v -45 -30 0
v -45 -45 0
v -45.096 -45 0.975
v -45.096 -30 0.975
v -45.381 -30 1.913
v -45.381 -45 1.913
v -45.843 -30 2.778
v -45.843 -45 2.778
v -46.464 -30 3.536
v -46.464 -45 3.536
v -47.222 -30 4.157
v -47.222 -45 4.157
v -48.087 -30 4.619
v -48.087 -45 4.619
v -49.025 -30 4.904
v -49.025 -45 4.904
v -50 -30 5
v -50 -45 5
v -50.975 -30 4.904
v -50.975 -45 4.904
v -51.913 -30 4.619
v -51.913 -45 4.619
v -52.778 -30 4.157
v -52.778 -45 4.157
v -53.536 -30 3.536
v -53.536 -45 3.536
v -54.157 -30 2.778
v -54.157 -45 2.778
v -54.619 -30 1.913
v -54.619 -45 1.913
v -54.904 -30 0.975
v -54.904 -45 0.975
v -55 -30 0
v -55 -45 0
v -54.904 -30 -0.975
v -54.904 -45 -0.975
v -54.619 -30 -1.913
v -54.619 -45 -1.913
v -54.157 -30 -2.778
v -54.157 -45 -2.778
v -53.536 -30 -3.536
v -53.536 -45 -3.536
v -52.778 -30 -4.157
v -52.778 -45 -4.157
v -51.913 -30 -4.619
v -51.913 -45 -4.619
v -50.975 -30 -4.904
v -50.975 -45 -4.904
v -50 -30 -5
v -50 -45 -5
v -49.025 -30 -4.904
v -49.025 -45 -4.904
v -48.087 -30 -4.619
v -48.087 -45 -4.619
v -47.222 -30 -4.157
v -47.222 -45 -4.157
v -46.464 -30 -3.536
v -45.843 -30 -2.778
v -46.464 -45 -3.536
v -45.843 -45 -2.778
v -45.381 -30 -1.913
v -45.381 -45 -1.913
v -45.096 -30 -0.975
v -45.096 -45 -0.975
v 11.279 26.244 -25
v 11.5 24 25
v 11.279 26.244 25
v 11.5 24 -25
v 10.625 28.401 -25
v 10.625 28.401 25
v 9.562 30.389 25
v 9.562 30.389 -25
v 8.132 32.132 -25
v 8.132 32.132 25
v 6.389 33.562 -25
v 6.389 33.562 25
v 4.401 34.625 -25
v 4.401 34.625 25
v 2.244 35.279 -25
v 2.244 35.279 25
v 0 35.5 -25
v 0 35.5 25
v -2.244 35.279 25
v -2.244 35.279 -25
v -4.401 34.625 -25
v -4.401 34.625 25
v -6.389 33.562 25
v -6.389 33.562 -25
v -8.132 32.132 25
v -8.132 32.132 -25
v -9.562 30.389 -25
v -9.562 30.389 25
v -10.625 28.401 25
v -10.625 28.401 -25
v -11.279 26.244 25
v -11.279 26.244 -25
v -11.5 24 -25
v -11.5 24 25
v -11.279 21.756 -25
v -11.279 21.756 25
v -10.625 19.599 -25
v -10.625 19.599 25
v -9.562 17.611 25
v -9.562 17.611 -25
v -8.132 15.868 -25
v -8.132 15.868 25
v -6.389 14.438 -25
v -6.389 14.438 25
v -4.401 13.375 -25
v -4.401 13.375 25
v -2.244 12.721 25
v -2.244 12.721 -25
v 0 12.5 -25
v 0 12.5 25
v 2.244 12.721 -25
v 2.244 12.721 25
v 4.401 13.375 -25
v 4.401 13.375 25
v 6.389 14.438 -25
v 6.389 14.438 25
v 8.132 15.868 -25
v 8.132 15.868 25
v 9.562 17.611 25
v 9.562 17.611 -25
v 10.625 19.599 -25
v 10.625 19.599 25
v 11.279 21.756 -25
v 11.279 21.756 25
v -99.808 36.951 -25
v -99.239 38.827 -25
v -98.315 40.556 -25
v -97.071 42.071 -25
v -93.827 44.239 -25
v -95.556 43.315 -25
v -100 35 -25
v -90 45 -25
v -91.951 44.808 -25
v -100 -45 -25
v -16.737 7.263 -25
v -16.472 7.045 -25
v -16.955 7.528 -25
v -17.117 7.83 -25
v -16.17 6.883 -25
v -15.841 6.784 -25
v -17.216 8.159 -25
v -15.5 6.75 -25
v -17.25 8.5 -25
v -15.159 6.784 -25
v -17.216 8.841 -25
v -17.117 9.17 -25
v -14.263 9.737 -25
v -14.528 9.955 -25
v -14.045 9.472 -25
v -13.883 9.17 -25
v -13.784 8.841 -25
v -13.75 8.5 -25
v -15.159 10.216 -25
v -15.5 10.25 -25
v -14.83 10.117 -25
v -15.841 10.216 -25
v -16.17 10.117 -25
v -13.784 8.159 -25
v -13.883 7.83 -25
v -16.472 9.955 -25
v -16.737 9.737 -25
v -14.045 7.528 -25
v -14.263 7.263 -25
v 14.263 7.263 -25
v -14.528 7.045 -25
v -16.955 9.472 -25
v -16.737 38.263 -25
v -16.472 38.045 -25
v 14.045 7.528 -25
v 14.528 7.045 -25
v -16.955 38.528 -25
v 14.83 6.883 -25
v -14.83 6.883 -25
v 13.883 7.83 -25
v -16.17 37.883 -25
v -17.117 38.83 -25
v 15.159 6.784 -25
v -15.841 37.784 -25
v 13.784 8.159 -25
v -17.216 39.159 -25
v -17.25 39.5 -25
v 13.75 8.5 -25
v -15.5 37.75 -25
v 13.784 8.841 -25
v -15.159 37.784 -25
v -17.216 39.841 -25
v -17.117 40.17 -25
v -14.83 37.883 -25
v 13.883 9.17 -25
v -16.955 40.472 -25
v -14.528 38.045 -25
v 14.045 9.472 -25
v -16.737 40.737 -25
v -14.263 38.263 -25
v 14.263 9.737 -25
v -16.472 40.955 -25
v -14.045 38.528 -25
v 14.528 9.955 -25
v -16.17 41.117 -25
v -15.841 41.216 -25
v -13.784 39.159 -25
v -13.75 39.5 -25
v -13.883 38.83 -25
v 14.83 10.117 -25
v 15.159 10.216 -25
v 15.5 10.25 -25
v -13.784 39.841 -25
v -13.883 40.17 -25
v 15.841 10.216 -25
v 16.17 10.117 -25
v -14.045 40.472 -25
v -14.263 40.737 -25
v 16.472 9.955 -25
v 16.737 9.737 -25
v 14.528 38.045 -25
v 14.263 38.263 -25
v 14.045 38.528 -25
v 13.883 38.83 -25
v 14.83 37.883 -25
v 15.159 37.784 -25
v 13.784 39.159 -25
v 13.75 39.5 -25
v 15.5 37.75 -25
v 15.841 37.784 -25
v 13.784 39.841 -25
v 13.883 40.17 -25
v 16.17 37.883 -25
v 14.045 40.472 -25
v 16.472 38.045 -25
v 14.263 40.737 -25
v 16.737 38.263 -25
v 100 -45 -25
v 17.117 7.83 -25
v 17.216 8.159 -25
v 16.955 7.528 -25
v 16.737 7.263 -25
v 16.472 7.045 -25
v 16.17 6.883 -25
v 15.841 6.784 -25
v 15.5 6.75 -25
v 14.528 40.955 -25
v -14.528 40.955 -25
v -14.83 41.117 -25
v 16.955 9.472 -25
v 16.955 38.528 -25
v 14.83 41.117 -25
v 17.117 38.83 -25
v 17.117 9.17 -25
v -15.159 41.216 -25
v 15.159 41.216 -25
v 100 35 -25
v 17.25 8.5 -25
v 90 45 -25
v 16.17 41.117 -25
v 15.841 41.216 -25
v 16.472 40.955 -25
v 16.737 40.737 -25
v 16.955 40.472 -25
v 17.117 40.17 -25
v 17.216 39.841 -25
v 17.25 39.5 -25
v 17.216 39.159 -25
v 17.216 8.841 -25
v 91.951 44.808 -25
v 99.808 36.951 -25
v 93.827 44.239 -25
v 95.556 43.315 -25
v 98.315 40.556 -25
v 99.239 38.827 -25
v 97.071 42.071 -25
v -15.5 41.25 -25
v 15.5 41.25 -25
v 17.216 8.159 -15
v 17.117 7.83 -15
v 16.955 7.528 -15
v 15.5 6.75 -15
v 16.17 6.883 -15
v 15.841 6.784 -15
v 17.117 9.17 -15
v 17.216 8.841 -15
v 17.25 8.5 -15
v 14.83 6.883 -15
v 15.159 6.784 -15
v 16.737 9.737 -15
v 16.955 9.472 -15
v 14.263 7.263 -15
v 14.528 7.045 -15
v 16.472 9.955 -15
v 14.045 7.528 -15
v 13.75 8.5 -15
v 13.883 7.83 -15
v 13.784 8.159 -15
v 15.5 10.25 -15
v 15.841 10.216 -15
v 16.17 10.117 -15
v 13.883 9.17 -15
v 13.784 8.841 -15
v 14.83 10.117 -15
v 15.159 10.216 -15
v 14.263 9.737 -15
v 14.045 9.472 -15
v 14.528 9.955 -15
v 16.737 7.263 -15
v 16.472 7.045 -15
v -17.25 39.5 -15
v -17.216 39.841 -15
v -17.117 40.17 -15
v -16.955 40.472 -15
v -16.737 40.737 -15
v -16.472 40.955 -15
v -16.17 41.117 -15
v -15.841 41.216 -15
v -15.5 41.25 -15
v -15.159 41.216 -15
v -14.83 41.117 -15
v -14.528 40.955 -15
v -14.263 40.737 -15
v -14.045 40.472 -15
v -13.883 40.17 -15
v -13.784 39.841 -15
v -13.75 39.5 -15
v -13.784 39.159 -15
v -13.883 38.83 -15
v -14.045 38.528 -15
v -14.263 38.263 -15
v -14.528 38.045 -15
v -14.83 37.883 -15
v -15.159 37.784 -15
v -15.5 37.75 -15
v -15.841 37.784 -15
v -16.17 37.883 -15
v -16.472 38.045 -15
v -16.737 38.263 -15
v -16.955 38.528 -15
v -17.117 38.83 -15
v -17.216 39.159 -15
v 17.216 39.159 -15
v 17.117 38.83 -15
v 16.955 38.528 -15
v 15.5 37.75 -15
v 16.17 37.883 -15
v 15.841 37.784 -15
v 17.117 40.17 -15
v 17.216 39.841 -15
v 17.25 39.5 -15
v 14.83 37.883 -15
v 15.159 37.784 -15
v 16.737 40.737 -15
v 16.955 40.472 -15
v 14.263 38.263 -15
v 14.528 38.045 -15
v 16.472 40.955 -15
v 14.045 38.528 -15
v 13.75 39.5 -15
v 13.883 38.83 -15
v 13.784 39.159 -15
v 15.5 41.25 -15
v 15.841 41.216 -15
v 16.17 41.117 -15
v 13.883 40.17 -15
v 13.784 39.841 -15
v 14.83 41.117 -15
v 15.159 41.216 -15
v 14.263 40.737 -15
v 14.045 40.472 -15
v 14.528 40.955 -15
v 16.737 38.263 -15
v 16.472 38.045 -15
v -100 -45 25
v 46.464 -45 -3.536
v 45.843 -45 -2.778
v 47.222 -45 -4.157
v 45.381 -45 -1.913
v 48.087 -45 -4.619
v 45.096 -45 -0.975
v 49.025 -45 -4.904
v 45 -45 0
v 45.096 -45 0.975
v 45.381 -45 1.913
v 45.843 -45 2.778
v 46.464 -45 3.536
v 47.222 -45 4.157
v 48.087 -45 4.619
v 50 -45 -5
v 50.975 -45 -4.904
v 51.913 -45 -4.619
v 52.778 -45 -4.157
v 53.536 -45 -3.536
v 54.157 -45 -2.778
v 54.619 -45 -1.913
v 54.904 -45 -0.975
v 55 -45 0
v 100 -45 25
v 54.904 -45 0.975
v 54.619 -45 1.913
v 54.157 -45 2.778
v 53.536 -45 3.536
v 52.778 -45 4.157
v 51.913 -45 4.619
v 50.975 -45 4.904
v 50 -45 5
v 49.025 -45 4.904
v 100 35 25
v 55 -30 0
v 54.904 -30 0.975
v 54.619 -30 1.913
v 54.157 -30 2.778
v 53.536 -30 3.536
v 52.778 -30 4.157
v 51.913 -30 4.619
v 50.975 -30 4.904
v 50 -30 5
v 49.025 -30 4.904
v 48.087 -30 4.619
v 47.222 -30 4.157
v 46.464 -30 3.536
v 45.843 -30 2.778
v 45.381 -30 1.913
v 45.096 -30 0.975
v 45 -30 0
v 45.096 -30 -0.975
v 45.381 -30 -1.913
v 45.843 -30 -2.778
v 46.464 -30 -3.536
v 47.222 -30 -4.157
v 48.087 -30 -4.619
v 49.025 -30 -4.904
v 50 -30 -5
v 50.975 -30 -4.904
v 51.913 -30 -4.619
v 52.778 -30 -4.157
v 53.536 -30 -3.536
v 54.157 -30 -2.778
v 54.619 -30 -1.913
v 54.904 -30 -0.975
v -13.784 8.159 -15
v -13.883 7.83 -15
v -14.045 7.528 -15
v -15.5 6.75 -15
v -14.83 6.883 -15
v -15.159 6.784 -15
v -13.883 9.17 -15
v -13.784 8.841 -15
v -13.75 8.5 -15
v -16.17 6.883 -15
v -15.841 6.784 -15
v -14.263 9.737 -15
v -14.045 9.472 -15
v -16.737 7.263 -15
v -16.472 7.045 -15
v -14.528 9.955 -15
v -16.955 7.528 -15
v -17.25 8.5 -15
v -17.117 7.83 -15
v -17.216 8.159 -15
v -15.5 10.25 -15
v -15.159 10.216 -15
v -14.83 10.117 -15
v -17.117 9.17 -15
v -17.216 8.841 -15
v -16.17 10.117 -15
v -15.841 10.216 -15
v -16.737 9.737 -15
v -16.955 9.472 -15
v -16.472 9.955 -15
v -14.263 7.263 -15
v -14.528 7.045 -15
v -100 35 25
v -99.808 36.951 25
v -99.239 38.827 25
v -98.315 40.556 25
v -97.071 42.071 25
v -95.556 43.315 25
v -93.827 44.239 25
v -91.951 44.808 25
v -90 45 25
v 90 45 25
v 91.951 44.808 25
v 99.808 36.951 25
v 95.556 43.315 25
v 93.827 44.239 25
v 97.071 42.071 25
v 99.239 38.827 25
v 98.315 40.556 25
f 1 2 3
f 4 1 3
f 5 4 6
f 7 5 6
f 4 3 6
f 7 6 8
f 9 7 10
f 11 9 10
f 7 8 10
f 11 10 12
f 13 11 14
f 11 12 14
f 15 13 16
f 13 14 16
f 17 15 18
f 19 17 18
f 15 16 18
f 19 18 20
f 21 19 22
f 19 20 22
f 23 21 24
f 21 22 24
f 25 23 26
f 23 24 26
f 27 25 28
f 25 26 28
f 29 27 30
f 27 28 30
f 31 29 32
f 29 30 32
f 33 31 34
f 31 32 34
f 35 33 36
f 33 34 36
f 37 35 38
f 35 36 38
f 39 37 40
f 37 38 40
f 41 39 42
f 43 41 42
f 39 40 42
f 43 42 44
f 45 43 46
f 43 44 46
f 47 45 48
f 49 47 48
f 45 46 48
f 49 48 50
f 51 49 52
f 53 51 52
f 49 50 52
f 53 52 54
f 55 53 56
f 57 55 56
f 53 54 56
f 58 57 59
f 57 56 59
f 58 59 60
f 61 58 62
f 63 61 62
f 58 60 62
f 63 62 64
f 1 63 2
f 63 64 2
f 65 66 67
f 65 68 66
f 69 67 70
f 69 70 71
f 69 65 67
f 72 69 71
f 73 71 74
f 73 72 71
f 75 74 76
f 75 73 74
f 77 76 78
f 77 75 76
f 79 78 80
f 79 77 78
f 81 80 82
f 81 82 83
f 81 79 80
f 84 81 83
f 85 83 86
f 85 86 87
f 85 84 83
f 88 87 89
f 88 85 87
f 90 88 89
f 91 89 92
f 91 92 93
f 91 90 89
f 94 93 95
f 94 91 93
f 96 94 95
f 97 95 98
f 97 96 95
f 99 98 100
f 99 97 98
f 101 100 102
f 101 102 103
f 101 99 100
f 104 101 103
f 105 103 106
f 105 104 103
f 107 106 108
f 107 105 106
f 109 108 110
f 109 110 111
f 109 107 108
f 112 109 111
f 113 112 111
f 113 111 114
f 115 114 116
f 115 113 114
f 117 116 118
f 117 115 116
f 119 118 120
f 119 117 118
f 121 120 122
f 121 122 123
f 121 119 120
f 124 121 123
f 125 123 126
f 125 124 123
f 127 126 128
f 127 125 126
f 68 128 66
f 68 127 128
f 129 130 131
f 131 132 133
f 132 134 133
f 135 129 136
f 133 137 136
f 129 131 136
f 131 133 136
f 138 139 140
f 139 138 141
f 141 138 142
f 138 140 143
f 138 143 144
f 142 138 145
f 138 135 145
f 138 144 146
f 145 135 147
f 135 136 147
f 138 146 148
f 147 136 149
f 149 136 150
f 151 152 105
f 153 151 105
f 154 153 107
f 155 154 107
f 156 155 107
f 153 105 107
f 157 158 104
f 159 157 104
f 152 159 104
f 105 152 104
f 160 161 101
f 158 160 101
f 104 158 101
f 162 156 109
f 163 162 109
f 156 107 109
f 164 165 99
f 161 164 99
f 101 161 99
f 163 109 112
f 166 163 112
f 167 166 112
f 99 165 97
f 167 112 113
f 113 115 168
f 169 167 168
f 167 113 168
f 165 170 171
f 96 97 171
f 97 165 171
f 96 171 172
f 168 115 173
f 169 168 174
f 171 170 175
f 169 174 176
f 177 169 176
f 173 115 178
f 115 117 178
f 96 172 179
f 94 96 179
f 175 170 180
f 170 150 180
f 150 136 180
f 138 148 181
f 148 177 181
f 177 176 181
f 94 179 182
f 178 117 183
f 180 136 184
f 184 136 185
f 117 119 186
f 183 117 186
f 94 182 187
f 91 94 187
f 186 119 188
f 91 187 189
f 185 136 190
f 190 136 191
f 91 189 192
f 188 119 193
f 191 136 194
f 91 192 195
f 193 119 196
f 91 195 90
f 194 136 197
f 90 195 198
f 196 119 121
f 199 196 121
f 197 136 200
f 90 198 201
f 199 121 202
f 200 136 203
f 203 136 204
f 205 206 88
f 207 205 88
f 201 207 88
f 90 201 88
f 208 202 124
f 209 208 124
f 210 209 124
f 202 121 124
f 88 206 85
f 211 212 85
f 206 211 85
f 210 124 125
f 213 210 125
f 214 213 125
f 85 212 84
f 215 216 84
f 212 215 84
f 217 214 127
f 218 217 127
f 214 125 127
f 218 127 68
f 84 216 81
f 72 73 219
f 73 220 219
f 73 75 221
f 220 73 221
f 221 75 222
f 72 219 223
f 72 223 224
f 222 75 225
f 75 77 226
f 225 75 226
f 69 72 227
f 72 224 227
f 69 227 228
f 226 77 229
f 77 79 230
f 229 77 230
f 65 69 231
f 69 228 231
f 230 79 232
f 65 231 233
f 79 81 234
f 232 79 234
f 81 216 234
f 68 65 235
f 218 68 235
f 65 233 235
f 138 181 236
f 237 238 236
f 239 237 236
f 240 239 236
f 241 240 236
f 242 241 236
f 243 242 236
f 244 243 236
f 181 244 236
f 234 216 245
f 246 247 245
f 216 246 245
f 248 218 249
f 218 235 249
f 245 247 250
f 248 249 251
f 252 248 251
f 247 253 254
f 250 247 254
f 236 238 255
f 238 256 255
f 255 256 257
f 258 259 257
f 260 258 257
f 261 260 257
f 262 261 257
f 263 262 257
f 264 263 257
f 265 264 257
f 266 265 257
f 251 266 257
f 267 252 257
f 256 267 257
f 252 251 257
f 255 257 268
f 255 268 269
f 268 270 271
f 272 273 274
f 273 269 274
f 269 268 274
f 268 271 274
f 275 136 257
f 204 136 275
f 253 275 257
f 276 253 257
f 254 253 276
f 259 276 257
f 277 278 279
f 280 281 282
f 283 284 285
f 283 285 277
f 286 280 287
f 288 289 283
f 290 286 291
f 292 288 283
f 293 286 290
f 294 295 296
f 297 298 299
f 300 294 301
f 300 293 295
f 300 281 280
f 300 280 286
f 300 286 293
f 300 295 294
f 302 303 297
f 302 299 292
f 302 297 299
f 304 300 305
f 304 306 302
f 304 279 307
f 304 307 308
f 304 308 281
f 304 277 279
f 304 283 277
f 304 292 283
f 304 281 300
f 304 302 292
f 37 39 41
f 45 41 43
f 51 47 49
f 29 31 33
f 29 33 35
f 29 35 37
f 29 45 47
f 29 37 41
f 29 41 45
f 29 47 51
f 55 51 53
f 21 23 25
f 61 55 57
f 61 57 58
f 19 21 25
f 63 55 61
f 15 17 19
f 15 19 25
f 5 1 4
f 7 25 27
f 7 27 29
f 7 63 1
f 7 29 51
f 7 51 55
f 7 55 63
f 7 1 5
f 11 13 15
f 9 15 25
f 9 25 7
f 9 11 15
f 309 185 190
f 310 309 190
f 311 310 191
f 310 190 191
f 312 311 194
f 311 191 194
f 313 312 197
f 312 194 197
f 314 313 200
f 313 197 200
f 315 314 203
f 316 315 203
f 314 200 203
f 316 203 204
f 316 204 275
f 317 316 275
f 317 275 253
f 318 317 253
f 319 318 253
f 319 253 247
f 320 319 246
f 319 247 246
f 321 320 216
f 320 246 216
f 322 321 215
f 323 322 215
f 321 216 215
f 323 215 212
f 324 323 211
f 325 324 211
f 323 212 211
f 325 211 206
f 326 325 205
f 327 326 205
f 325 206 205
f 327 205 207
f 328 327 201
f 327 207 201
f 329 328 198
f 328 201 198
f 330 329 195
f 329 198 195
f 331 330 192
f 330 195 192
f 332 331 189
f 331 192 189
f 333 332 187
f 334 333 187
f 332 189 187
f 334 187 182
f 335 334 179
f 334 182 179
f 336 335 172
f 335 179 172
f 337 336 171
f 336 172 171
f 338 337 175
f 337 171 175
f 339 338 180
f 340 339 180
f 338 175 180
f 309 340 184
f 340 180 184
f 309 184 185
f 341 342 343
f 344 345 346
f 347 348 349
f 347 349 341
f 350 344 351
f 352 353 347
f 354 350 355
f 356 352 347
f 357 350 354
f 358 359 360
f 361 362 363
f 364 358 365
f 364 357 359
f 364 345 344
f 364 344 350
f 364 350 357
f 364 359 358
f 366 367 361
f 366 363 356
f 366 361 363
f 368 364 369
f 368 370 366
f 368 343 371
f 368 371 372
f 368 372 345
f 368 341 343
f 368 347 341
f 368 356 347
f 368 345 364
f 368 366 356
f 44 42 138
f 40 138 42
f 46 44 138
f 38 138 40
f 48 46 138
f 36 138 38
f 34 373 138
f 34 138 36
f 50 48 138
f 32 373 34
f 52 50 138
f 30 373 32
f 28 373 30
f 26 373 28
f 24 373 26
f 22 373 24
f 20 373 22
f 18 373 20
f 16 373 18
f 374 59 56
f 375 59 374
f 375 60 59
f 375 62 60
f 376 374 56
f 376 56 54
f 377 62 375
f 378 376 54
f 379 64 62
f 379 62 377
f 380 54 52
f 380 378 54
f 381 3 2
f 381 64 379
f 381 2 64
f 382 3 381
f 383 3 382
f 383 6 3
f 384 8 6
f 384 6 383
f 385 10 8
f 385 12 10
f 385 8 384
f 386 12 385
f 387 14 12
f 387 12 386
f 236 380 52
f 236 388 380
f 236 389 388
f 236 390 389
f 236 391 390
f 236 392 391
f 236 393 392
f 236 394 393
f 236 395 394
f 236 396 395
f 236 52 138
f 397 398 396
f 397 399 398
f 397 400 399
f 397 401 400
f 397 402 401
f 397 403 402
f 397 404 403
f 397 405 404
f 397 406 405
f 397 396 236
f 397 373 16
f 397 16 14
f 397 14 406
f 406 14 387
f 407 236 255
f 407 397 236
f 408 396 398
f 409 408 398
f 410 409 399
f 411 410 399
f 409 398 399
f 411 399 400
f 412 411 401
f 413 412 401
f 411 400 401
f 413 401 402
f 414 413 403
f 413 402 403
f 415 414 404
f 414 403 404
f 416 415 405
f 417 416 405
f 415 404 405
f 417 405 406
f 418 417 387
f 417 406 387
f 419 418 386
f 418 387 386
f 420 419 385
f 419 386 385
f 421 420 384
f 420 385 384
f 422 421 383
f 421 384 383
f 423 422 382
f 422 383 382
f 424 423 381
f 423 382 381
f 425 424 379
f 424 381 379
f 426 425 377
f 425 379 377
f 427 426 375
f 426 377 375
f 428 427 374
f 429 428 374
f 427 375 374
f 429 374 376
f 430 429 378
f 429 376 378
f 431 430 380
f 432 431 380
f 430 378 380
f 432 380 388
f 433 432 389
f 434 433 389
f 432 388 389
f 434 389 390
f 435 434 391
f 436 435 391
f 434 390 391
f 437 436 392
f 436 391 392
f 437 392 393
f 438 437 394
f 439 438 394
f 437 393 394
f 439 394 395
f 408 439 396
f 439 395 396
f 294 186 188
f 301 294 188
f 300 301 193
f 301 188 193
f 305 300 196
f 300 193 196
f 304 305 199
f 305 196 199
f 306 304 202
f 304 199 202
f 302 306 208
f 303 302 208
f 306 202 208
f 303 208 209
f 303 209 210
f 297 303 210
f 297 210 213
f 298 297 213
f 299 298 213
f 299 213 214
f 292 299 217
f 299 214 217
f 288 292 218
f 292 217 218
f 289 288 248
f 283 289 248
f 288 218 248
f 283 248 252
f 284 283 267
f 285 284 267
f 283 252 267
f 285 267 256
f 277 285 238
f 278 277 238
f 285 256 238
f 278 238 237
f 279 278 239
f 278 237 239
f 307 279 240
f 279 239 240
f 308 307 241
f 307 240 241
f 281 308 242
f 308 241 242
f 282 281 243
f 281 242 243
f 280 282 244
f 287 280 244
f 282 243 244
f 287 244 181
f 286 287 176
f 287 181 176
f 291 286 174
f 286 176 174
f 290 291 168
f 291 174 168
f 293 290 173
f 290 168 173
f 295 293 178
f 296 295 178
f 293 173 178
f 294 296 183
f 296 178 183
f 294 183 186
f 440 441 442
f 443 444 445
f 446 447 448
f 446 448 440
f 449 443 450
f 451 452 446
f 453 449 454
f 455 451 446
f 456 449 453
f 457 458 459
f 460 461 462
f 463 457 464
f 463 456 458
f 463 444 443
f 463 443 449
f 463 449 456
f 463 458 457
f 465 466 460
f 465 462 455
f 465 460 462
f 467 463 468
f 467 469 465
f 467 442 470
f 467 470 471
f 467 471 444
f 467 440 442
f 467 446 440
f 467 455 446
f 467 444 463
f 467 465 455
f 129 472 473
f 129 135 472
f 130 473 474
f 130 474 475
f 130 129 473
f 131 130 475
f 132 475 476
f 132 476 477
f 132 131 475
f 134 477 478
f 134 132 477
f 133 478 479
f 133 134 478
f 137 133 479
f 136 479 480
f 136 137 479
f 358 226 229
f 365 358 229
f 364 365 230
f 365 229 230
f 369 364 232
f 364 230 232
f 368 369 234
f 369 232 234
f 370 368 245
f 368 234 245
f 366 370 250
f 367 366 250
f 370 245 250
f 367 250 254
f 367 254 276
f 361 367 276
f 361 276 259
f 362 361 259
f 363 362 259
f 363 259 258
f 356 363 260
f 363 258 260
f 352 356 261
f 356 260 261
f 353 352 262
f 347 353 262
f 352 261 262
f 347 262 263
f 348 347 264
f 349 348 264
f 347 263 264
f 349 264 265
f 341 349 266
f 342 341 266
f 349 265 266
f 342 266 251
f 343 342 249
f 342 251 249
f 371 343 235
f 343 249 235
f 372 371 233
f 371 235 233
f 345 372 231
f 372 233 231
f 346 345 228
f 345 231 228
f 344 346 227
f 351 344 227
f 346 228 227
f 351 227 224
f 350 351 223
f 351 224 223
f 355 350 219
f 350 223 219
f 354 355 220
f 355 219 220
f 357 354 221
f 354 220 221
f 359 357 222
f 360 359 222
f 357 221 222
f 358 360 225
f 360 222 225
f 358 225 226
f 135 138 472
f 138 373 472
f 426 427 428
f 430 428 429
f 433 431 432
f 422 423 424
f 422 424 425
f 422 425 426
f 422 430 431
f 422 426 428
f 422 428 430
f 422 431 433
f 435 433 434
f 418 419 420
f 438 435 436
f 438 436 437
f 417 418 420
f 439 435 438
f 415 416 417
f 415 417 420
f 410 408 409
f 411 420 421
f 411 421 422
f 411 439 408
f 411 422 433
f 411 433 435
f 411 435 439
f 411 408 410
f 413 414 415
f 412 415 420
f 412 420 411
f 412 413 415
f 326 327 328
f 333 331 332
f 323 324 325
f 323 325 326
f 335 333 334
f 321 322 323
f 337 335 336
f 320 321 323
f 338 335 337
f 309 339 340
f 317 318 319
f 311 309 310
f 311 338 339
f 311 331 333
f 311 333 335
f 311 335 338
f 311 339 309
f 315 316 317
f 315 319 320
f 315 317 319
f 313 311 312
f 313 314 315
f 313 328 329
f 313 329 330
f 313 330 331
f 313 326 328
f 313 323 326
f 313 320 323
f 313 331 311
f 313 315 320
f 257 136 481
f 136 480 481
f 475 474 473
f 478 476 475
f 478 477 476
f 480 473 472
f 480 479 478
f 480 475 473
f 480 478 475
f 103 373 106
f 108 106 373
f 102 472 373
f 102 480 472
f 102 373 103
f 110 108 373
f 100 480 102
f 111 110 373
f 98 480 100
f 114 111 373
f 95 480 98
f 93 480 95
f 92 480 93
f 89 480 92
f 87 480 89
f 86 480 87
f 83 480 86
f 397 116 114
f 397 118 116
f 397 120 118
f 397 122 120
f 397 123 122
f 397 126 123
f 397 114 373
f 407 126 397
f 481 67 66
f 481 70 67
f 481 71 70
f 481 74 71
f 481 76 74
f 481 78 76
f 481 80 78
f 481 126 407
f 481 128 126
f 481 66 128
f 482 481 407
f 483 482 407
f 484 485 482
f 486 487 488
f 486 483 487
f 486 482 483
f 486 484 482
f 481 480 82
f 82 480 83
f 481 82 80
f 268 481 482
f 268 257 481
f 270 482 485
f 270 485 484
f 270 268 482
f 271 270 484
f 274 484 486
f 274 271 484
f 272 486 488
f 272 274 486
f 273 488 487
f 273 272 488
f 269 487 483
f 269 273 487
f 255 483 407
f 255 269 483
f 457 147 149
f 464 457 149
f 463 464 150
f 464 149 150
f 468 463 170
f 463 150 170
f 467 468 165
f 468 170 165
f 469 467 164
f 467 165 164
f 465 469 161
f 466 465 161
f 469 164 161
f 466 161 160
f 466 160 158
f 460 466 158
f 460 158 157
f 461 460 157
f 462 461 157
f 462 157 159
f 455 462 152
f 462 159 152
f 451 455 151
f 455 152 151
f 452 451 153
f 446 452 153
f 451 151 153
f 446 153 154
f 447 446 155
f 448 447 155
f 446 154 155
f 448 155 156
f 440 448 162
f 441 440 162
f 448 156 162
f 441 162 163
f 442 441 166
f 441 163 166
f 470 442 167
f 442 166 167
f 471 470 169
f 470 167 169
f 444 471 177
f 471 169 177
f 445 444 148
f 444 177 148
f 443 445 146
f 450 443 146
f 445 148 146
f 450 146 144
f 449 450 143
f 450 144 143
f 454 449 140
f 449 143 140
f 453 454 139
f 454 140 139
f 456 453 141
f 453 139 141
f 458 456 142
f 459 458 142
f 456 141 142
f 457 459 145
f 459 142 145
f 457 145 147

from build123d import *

# Parameters (mm, degrees)
SKETCH1_W           = 200
SKETCH1_H           = 90
SKETCH1_R           = 11.5
BOSS_EXTRUDE1_DEPTH = 25
SKETCH2_R           = 1.75
CUT_EXTRUDE1_DEPTH  = 10
SKETCH3_R           = 5
CUT_EXTRUDE2_DEPTH  = 15
FILLET1_R           = 10


with BuildPart() as part:
    # Sketch1 → Boss-Extrude1 (new body, symmetric)
    with BuildSketch(Plane.XY):
        Rectangle(SKETCH1_W, SKETCH1_H)
        with Locations((0, 24)):
            Circle(SKETCH1_R, mode=Mode.SUBTRACT)
    extrude(amount=BOSS_EXTRUDE1_DEPTH, both=True)

    # Sketch2 → Cut-Extrude1 (cut)
    with BuildSketch(Plane(origin=(0, 0, -25), x_dir=(-1, 0, 0), z_dir=(0, 0, -1))):
        with Locations((-15.5, 8.5)):
            Circle(SKETCH2_R)
        with Locations((15.5, 8.5)):
            Circle(SKETCH2_R)
        with Locations((15.5, 39.5)):
            Circle(SKETCH2_R)
        with Locations((-15.5, 39.5)):
            Circle(SKETCH2_R)
    extrude(amount=-CUT_EXTRUDE1_DEPTH, mode=Mode.SUBTRACT)

    # Sketch3 → Cut-Extrude2 (cut)
    with BuildSketch(Plane.XZ.offset(45)):
        with Locations((-50, 0)):
            Circle(SKETCH3_R)
        with Locations((50, 0)):
            Circle(SKETCH3_R)
    extrude(amount=-CUT_EXTRUDE2_DEPTH, mode=Mode.SUBTRACT)

    # Fillet1
    fillet1_edges = [part.edges().sort_by_distance(p)[0] for p in [
        (100, 45, 0),
        (-100, 45, 0),
    ]]
    fillet(fillet1_edges, radius=FILLET1_R)


solid = part.part
